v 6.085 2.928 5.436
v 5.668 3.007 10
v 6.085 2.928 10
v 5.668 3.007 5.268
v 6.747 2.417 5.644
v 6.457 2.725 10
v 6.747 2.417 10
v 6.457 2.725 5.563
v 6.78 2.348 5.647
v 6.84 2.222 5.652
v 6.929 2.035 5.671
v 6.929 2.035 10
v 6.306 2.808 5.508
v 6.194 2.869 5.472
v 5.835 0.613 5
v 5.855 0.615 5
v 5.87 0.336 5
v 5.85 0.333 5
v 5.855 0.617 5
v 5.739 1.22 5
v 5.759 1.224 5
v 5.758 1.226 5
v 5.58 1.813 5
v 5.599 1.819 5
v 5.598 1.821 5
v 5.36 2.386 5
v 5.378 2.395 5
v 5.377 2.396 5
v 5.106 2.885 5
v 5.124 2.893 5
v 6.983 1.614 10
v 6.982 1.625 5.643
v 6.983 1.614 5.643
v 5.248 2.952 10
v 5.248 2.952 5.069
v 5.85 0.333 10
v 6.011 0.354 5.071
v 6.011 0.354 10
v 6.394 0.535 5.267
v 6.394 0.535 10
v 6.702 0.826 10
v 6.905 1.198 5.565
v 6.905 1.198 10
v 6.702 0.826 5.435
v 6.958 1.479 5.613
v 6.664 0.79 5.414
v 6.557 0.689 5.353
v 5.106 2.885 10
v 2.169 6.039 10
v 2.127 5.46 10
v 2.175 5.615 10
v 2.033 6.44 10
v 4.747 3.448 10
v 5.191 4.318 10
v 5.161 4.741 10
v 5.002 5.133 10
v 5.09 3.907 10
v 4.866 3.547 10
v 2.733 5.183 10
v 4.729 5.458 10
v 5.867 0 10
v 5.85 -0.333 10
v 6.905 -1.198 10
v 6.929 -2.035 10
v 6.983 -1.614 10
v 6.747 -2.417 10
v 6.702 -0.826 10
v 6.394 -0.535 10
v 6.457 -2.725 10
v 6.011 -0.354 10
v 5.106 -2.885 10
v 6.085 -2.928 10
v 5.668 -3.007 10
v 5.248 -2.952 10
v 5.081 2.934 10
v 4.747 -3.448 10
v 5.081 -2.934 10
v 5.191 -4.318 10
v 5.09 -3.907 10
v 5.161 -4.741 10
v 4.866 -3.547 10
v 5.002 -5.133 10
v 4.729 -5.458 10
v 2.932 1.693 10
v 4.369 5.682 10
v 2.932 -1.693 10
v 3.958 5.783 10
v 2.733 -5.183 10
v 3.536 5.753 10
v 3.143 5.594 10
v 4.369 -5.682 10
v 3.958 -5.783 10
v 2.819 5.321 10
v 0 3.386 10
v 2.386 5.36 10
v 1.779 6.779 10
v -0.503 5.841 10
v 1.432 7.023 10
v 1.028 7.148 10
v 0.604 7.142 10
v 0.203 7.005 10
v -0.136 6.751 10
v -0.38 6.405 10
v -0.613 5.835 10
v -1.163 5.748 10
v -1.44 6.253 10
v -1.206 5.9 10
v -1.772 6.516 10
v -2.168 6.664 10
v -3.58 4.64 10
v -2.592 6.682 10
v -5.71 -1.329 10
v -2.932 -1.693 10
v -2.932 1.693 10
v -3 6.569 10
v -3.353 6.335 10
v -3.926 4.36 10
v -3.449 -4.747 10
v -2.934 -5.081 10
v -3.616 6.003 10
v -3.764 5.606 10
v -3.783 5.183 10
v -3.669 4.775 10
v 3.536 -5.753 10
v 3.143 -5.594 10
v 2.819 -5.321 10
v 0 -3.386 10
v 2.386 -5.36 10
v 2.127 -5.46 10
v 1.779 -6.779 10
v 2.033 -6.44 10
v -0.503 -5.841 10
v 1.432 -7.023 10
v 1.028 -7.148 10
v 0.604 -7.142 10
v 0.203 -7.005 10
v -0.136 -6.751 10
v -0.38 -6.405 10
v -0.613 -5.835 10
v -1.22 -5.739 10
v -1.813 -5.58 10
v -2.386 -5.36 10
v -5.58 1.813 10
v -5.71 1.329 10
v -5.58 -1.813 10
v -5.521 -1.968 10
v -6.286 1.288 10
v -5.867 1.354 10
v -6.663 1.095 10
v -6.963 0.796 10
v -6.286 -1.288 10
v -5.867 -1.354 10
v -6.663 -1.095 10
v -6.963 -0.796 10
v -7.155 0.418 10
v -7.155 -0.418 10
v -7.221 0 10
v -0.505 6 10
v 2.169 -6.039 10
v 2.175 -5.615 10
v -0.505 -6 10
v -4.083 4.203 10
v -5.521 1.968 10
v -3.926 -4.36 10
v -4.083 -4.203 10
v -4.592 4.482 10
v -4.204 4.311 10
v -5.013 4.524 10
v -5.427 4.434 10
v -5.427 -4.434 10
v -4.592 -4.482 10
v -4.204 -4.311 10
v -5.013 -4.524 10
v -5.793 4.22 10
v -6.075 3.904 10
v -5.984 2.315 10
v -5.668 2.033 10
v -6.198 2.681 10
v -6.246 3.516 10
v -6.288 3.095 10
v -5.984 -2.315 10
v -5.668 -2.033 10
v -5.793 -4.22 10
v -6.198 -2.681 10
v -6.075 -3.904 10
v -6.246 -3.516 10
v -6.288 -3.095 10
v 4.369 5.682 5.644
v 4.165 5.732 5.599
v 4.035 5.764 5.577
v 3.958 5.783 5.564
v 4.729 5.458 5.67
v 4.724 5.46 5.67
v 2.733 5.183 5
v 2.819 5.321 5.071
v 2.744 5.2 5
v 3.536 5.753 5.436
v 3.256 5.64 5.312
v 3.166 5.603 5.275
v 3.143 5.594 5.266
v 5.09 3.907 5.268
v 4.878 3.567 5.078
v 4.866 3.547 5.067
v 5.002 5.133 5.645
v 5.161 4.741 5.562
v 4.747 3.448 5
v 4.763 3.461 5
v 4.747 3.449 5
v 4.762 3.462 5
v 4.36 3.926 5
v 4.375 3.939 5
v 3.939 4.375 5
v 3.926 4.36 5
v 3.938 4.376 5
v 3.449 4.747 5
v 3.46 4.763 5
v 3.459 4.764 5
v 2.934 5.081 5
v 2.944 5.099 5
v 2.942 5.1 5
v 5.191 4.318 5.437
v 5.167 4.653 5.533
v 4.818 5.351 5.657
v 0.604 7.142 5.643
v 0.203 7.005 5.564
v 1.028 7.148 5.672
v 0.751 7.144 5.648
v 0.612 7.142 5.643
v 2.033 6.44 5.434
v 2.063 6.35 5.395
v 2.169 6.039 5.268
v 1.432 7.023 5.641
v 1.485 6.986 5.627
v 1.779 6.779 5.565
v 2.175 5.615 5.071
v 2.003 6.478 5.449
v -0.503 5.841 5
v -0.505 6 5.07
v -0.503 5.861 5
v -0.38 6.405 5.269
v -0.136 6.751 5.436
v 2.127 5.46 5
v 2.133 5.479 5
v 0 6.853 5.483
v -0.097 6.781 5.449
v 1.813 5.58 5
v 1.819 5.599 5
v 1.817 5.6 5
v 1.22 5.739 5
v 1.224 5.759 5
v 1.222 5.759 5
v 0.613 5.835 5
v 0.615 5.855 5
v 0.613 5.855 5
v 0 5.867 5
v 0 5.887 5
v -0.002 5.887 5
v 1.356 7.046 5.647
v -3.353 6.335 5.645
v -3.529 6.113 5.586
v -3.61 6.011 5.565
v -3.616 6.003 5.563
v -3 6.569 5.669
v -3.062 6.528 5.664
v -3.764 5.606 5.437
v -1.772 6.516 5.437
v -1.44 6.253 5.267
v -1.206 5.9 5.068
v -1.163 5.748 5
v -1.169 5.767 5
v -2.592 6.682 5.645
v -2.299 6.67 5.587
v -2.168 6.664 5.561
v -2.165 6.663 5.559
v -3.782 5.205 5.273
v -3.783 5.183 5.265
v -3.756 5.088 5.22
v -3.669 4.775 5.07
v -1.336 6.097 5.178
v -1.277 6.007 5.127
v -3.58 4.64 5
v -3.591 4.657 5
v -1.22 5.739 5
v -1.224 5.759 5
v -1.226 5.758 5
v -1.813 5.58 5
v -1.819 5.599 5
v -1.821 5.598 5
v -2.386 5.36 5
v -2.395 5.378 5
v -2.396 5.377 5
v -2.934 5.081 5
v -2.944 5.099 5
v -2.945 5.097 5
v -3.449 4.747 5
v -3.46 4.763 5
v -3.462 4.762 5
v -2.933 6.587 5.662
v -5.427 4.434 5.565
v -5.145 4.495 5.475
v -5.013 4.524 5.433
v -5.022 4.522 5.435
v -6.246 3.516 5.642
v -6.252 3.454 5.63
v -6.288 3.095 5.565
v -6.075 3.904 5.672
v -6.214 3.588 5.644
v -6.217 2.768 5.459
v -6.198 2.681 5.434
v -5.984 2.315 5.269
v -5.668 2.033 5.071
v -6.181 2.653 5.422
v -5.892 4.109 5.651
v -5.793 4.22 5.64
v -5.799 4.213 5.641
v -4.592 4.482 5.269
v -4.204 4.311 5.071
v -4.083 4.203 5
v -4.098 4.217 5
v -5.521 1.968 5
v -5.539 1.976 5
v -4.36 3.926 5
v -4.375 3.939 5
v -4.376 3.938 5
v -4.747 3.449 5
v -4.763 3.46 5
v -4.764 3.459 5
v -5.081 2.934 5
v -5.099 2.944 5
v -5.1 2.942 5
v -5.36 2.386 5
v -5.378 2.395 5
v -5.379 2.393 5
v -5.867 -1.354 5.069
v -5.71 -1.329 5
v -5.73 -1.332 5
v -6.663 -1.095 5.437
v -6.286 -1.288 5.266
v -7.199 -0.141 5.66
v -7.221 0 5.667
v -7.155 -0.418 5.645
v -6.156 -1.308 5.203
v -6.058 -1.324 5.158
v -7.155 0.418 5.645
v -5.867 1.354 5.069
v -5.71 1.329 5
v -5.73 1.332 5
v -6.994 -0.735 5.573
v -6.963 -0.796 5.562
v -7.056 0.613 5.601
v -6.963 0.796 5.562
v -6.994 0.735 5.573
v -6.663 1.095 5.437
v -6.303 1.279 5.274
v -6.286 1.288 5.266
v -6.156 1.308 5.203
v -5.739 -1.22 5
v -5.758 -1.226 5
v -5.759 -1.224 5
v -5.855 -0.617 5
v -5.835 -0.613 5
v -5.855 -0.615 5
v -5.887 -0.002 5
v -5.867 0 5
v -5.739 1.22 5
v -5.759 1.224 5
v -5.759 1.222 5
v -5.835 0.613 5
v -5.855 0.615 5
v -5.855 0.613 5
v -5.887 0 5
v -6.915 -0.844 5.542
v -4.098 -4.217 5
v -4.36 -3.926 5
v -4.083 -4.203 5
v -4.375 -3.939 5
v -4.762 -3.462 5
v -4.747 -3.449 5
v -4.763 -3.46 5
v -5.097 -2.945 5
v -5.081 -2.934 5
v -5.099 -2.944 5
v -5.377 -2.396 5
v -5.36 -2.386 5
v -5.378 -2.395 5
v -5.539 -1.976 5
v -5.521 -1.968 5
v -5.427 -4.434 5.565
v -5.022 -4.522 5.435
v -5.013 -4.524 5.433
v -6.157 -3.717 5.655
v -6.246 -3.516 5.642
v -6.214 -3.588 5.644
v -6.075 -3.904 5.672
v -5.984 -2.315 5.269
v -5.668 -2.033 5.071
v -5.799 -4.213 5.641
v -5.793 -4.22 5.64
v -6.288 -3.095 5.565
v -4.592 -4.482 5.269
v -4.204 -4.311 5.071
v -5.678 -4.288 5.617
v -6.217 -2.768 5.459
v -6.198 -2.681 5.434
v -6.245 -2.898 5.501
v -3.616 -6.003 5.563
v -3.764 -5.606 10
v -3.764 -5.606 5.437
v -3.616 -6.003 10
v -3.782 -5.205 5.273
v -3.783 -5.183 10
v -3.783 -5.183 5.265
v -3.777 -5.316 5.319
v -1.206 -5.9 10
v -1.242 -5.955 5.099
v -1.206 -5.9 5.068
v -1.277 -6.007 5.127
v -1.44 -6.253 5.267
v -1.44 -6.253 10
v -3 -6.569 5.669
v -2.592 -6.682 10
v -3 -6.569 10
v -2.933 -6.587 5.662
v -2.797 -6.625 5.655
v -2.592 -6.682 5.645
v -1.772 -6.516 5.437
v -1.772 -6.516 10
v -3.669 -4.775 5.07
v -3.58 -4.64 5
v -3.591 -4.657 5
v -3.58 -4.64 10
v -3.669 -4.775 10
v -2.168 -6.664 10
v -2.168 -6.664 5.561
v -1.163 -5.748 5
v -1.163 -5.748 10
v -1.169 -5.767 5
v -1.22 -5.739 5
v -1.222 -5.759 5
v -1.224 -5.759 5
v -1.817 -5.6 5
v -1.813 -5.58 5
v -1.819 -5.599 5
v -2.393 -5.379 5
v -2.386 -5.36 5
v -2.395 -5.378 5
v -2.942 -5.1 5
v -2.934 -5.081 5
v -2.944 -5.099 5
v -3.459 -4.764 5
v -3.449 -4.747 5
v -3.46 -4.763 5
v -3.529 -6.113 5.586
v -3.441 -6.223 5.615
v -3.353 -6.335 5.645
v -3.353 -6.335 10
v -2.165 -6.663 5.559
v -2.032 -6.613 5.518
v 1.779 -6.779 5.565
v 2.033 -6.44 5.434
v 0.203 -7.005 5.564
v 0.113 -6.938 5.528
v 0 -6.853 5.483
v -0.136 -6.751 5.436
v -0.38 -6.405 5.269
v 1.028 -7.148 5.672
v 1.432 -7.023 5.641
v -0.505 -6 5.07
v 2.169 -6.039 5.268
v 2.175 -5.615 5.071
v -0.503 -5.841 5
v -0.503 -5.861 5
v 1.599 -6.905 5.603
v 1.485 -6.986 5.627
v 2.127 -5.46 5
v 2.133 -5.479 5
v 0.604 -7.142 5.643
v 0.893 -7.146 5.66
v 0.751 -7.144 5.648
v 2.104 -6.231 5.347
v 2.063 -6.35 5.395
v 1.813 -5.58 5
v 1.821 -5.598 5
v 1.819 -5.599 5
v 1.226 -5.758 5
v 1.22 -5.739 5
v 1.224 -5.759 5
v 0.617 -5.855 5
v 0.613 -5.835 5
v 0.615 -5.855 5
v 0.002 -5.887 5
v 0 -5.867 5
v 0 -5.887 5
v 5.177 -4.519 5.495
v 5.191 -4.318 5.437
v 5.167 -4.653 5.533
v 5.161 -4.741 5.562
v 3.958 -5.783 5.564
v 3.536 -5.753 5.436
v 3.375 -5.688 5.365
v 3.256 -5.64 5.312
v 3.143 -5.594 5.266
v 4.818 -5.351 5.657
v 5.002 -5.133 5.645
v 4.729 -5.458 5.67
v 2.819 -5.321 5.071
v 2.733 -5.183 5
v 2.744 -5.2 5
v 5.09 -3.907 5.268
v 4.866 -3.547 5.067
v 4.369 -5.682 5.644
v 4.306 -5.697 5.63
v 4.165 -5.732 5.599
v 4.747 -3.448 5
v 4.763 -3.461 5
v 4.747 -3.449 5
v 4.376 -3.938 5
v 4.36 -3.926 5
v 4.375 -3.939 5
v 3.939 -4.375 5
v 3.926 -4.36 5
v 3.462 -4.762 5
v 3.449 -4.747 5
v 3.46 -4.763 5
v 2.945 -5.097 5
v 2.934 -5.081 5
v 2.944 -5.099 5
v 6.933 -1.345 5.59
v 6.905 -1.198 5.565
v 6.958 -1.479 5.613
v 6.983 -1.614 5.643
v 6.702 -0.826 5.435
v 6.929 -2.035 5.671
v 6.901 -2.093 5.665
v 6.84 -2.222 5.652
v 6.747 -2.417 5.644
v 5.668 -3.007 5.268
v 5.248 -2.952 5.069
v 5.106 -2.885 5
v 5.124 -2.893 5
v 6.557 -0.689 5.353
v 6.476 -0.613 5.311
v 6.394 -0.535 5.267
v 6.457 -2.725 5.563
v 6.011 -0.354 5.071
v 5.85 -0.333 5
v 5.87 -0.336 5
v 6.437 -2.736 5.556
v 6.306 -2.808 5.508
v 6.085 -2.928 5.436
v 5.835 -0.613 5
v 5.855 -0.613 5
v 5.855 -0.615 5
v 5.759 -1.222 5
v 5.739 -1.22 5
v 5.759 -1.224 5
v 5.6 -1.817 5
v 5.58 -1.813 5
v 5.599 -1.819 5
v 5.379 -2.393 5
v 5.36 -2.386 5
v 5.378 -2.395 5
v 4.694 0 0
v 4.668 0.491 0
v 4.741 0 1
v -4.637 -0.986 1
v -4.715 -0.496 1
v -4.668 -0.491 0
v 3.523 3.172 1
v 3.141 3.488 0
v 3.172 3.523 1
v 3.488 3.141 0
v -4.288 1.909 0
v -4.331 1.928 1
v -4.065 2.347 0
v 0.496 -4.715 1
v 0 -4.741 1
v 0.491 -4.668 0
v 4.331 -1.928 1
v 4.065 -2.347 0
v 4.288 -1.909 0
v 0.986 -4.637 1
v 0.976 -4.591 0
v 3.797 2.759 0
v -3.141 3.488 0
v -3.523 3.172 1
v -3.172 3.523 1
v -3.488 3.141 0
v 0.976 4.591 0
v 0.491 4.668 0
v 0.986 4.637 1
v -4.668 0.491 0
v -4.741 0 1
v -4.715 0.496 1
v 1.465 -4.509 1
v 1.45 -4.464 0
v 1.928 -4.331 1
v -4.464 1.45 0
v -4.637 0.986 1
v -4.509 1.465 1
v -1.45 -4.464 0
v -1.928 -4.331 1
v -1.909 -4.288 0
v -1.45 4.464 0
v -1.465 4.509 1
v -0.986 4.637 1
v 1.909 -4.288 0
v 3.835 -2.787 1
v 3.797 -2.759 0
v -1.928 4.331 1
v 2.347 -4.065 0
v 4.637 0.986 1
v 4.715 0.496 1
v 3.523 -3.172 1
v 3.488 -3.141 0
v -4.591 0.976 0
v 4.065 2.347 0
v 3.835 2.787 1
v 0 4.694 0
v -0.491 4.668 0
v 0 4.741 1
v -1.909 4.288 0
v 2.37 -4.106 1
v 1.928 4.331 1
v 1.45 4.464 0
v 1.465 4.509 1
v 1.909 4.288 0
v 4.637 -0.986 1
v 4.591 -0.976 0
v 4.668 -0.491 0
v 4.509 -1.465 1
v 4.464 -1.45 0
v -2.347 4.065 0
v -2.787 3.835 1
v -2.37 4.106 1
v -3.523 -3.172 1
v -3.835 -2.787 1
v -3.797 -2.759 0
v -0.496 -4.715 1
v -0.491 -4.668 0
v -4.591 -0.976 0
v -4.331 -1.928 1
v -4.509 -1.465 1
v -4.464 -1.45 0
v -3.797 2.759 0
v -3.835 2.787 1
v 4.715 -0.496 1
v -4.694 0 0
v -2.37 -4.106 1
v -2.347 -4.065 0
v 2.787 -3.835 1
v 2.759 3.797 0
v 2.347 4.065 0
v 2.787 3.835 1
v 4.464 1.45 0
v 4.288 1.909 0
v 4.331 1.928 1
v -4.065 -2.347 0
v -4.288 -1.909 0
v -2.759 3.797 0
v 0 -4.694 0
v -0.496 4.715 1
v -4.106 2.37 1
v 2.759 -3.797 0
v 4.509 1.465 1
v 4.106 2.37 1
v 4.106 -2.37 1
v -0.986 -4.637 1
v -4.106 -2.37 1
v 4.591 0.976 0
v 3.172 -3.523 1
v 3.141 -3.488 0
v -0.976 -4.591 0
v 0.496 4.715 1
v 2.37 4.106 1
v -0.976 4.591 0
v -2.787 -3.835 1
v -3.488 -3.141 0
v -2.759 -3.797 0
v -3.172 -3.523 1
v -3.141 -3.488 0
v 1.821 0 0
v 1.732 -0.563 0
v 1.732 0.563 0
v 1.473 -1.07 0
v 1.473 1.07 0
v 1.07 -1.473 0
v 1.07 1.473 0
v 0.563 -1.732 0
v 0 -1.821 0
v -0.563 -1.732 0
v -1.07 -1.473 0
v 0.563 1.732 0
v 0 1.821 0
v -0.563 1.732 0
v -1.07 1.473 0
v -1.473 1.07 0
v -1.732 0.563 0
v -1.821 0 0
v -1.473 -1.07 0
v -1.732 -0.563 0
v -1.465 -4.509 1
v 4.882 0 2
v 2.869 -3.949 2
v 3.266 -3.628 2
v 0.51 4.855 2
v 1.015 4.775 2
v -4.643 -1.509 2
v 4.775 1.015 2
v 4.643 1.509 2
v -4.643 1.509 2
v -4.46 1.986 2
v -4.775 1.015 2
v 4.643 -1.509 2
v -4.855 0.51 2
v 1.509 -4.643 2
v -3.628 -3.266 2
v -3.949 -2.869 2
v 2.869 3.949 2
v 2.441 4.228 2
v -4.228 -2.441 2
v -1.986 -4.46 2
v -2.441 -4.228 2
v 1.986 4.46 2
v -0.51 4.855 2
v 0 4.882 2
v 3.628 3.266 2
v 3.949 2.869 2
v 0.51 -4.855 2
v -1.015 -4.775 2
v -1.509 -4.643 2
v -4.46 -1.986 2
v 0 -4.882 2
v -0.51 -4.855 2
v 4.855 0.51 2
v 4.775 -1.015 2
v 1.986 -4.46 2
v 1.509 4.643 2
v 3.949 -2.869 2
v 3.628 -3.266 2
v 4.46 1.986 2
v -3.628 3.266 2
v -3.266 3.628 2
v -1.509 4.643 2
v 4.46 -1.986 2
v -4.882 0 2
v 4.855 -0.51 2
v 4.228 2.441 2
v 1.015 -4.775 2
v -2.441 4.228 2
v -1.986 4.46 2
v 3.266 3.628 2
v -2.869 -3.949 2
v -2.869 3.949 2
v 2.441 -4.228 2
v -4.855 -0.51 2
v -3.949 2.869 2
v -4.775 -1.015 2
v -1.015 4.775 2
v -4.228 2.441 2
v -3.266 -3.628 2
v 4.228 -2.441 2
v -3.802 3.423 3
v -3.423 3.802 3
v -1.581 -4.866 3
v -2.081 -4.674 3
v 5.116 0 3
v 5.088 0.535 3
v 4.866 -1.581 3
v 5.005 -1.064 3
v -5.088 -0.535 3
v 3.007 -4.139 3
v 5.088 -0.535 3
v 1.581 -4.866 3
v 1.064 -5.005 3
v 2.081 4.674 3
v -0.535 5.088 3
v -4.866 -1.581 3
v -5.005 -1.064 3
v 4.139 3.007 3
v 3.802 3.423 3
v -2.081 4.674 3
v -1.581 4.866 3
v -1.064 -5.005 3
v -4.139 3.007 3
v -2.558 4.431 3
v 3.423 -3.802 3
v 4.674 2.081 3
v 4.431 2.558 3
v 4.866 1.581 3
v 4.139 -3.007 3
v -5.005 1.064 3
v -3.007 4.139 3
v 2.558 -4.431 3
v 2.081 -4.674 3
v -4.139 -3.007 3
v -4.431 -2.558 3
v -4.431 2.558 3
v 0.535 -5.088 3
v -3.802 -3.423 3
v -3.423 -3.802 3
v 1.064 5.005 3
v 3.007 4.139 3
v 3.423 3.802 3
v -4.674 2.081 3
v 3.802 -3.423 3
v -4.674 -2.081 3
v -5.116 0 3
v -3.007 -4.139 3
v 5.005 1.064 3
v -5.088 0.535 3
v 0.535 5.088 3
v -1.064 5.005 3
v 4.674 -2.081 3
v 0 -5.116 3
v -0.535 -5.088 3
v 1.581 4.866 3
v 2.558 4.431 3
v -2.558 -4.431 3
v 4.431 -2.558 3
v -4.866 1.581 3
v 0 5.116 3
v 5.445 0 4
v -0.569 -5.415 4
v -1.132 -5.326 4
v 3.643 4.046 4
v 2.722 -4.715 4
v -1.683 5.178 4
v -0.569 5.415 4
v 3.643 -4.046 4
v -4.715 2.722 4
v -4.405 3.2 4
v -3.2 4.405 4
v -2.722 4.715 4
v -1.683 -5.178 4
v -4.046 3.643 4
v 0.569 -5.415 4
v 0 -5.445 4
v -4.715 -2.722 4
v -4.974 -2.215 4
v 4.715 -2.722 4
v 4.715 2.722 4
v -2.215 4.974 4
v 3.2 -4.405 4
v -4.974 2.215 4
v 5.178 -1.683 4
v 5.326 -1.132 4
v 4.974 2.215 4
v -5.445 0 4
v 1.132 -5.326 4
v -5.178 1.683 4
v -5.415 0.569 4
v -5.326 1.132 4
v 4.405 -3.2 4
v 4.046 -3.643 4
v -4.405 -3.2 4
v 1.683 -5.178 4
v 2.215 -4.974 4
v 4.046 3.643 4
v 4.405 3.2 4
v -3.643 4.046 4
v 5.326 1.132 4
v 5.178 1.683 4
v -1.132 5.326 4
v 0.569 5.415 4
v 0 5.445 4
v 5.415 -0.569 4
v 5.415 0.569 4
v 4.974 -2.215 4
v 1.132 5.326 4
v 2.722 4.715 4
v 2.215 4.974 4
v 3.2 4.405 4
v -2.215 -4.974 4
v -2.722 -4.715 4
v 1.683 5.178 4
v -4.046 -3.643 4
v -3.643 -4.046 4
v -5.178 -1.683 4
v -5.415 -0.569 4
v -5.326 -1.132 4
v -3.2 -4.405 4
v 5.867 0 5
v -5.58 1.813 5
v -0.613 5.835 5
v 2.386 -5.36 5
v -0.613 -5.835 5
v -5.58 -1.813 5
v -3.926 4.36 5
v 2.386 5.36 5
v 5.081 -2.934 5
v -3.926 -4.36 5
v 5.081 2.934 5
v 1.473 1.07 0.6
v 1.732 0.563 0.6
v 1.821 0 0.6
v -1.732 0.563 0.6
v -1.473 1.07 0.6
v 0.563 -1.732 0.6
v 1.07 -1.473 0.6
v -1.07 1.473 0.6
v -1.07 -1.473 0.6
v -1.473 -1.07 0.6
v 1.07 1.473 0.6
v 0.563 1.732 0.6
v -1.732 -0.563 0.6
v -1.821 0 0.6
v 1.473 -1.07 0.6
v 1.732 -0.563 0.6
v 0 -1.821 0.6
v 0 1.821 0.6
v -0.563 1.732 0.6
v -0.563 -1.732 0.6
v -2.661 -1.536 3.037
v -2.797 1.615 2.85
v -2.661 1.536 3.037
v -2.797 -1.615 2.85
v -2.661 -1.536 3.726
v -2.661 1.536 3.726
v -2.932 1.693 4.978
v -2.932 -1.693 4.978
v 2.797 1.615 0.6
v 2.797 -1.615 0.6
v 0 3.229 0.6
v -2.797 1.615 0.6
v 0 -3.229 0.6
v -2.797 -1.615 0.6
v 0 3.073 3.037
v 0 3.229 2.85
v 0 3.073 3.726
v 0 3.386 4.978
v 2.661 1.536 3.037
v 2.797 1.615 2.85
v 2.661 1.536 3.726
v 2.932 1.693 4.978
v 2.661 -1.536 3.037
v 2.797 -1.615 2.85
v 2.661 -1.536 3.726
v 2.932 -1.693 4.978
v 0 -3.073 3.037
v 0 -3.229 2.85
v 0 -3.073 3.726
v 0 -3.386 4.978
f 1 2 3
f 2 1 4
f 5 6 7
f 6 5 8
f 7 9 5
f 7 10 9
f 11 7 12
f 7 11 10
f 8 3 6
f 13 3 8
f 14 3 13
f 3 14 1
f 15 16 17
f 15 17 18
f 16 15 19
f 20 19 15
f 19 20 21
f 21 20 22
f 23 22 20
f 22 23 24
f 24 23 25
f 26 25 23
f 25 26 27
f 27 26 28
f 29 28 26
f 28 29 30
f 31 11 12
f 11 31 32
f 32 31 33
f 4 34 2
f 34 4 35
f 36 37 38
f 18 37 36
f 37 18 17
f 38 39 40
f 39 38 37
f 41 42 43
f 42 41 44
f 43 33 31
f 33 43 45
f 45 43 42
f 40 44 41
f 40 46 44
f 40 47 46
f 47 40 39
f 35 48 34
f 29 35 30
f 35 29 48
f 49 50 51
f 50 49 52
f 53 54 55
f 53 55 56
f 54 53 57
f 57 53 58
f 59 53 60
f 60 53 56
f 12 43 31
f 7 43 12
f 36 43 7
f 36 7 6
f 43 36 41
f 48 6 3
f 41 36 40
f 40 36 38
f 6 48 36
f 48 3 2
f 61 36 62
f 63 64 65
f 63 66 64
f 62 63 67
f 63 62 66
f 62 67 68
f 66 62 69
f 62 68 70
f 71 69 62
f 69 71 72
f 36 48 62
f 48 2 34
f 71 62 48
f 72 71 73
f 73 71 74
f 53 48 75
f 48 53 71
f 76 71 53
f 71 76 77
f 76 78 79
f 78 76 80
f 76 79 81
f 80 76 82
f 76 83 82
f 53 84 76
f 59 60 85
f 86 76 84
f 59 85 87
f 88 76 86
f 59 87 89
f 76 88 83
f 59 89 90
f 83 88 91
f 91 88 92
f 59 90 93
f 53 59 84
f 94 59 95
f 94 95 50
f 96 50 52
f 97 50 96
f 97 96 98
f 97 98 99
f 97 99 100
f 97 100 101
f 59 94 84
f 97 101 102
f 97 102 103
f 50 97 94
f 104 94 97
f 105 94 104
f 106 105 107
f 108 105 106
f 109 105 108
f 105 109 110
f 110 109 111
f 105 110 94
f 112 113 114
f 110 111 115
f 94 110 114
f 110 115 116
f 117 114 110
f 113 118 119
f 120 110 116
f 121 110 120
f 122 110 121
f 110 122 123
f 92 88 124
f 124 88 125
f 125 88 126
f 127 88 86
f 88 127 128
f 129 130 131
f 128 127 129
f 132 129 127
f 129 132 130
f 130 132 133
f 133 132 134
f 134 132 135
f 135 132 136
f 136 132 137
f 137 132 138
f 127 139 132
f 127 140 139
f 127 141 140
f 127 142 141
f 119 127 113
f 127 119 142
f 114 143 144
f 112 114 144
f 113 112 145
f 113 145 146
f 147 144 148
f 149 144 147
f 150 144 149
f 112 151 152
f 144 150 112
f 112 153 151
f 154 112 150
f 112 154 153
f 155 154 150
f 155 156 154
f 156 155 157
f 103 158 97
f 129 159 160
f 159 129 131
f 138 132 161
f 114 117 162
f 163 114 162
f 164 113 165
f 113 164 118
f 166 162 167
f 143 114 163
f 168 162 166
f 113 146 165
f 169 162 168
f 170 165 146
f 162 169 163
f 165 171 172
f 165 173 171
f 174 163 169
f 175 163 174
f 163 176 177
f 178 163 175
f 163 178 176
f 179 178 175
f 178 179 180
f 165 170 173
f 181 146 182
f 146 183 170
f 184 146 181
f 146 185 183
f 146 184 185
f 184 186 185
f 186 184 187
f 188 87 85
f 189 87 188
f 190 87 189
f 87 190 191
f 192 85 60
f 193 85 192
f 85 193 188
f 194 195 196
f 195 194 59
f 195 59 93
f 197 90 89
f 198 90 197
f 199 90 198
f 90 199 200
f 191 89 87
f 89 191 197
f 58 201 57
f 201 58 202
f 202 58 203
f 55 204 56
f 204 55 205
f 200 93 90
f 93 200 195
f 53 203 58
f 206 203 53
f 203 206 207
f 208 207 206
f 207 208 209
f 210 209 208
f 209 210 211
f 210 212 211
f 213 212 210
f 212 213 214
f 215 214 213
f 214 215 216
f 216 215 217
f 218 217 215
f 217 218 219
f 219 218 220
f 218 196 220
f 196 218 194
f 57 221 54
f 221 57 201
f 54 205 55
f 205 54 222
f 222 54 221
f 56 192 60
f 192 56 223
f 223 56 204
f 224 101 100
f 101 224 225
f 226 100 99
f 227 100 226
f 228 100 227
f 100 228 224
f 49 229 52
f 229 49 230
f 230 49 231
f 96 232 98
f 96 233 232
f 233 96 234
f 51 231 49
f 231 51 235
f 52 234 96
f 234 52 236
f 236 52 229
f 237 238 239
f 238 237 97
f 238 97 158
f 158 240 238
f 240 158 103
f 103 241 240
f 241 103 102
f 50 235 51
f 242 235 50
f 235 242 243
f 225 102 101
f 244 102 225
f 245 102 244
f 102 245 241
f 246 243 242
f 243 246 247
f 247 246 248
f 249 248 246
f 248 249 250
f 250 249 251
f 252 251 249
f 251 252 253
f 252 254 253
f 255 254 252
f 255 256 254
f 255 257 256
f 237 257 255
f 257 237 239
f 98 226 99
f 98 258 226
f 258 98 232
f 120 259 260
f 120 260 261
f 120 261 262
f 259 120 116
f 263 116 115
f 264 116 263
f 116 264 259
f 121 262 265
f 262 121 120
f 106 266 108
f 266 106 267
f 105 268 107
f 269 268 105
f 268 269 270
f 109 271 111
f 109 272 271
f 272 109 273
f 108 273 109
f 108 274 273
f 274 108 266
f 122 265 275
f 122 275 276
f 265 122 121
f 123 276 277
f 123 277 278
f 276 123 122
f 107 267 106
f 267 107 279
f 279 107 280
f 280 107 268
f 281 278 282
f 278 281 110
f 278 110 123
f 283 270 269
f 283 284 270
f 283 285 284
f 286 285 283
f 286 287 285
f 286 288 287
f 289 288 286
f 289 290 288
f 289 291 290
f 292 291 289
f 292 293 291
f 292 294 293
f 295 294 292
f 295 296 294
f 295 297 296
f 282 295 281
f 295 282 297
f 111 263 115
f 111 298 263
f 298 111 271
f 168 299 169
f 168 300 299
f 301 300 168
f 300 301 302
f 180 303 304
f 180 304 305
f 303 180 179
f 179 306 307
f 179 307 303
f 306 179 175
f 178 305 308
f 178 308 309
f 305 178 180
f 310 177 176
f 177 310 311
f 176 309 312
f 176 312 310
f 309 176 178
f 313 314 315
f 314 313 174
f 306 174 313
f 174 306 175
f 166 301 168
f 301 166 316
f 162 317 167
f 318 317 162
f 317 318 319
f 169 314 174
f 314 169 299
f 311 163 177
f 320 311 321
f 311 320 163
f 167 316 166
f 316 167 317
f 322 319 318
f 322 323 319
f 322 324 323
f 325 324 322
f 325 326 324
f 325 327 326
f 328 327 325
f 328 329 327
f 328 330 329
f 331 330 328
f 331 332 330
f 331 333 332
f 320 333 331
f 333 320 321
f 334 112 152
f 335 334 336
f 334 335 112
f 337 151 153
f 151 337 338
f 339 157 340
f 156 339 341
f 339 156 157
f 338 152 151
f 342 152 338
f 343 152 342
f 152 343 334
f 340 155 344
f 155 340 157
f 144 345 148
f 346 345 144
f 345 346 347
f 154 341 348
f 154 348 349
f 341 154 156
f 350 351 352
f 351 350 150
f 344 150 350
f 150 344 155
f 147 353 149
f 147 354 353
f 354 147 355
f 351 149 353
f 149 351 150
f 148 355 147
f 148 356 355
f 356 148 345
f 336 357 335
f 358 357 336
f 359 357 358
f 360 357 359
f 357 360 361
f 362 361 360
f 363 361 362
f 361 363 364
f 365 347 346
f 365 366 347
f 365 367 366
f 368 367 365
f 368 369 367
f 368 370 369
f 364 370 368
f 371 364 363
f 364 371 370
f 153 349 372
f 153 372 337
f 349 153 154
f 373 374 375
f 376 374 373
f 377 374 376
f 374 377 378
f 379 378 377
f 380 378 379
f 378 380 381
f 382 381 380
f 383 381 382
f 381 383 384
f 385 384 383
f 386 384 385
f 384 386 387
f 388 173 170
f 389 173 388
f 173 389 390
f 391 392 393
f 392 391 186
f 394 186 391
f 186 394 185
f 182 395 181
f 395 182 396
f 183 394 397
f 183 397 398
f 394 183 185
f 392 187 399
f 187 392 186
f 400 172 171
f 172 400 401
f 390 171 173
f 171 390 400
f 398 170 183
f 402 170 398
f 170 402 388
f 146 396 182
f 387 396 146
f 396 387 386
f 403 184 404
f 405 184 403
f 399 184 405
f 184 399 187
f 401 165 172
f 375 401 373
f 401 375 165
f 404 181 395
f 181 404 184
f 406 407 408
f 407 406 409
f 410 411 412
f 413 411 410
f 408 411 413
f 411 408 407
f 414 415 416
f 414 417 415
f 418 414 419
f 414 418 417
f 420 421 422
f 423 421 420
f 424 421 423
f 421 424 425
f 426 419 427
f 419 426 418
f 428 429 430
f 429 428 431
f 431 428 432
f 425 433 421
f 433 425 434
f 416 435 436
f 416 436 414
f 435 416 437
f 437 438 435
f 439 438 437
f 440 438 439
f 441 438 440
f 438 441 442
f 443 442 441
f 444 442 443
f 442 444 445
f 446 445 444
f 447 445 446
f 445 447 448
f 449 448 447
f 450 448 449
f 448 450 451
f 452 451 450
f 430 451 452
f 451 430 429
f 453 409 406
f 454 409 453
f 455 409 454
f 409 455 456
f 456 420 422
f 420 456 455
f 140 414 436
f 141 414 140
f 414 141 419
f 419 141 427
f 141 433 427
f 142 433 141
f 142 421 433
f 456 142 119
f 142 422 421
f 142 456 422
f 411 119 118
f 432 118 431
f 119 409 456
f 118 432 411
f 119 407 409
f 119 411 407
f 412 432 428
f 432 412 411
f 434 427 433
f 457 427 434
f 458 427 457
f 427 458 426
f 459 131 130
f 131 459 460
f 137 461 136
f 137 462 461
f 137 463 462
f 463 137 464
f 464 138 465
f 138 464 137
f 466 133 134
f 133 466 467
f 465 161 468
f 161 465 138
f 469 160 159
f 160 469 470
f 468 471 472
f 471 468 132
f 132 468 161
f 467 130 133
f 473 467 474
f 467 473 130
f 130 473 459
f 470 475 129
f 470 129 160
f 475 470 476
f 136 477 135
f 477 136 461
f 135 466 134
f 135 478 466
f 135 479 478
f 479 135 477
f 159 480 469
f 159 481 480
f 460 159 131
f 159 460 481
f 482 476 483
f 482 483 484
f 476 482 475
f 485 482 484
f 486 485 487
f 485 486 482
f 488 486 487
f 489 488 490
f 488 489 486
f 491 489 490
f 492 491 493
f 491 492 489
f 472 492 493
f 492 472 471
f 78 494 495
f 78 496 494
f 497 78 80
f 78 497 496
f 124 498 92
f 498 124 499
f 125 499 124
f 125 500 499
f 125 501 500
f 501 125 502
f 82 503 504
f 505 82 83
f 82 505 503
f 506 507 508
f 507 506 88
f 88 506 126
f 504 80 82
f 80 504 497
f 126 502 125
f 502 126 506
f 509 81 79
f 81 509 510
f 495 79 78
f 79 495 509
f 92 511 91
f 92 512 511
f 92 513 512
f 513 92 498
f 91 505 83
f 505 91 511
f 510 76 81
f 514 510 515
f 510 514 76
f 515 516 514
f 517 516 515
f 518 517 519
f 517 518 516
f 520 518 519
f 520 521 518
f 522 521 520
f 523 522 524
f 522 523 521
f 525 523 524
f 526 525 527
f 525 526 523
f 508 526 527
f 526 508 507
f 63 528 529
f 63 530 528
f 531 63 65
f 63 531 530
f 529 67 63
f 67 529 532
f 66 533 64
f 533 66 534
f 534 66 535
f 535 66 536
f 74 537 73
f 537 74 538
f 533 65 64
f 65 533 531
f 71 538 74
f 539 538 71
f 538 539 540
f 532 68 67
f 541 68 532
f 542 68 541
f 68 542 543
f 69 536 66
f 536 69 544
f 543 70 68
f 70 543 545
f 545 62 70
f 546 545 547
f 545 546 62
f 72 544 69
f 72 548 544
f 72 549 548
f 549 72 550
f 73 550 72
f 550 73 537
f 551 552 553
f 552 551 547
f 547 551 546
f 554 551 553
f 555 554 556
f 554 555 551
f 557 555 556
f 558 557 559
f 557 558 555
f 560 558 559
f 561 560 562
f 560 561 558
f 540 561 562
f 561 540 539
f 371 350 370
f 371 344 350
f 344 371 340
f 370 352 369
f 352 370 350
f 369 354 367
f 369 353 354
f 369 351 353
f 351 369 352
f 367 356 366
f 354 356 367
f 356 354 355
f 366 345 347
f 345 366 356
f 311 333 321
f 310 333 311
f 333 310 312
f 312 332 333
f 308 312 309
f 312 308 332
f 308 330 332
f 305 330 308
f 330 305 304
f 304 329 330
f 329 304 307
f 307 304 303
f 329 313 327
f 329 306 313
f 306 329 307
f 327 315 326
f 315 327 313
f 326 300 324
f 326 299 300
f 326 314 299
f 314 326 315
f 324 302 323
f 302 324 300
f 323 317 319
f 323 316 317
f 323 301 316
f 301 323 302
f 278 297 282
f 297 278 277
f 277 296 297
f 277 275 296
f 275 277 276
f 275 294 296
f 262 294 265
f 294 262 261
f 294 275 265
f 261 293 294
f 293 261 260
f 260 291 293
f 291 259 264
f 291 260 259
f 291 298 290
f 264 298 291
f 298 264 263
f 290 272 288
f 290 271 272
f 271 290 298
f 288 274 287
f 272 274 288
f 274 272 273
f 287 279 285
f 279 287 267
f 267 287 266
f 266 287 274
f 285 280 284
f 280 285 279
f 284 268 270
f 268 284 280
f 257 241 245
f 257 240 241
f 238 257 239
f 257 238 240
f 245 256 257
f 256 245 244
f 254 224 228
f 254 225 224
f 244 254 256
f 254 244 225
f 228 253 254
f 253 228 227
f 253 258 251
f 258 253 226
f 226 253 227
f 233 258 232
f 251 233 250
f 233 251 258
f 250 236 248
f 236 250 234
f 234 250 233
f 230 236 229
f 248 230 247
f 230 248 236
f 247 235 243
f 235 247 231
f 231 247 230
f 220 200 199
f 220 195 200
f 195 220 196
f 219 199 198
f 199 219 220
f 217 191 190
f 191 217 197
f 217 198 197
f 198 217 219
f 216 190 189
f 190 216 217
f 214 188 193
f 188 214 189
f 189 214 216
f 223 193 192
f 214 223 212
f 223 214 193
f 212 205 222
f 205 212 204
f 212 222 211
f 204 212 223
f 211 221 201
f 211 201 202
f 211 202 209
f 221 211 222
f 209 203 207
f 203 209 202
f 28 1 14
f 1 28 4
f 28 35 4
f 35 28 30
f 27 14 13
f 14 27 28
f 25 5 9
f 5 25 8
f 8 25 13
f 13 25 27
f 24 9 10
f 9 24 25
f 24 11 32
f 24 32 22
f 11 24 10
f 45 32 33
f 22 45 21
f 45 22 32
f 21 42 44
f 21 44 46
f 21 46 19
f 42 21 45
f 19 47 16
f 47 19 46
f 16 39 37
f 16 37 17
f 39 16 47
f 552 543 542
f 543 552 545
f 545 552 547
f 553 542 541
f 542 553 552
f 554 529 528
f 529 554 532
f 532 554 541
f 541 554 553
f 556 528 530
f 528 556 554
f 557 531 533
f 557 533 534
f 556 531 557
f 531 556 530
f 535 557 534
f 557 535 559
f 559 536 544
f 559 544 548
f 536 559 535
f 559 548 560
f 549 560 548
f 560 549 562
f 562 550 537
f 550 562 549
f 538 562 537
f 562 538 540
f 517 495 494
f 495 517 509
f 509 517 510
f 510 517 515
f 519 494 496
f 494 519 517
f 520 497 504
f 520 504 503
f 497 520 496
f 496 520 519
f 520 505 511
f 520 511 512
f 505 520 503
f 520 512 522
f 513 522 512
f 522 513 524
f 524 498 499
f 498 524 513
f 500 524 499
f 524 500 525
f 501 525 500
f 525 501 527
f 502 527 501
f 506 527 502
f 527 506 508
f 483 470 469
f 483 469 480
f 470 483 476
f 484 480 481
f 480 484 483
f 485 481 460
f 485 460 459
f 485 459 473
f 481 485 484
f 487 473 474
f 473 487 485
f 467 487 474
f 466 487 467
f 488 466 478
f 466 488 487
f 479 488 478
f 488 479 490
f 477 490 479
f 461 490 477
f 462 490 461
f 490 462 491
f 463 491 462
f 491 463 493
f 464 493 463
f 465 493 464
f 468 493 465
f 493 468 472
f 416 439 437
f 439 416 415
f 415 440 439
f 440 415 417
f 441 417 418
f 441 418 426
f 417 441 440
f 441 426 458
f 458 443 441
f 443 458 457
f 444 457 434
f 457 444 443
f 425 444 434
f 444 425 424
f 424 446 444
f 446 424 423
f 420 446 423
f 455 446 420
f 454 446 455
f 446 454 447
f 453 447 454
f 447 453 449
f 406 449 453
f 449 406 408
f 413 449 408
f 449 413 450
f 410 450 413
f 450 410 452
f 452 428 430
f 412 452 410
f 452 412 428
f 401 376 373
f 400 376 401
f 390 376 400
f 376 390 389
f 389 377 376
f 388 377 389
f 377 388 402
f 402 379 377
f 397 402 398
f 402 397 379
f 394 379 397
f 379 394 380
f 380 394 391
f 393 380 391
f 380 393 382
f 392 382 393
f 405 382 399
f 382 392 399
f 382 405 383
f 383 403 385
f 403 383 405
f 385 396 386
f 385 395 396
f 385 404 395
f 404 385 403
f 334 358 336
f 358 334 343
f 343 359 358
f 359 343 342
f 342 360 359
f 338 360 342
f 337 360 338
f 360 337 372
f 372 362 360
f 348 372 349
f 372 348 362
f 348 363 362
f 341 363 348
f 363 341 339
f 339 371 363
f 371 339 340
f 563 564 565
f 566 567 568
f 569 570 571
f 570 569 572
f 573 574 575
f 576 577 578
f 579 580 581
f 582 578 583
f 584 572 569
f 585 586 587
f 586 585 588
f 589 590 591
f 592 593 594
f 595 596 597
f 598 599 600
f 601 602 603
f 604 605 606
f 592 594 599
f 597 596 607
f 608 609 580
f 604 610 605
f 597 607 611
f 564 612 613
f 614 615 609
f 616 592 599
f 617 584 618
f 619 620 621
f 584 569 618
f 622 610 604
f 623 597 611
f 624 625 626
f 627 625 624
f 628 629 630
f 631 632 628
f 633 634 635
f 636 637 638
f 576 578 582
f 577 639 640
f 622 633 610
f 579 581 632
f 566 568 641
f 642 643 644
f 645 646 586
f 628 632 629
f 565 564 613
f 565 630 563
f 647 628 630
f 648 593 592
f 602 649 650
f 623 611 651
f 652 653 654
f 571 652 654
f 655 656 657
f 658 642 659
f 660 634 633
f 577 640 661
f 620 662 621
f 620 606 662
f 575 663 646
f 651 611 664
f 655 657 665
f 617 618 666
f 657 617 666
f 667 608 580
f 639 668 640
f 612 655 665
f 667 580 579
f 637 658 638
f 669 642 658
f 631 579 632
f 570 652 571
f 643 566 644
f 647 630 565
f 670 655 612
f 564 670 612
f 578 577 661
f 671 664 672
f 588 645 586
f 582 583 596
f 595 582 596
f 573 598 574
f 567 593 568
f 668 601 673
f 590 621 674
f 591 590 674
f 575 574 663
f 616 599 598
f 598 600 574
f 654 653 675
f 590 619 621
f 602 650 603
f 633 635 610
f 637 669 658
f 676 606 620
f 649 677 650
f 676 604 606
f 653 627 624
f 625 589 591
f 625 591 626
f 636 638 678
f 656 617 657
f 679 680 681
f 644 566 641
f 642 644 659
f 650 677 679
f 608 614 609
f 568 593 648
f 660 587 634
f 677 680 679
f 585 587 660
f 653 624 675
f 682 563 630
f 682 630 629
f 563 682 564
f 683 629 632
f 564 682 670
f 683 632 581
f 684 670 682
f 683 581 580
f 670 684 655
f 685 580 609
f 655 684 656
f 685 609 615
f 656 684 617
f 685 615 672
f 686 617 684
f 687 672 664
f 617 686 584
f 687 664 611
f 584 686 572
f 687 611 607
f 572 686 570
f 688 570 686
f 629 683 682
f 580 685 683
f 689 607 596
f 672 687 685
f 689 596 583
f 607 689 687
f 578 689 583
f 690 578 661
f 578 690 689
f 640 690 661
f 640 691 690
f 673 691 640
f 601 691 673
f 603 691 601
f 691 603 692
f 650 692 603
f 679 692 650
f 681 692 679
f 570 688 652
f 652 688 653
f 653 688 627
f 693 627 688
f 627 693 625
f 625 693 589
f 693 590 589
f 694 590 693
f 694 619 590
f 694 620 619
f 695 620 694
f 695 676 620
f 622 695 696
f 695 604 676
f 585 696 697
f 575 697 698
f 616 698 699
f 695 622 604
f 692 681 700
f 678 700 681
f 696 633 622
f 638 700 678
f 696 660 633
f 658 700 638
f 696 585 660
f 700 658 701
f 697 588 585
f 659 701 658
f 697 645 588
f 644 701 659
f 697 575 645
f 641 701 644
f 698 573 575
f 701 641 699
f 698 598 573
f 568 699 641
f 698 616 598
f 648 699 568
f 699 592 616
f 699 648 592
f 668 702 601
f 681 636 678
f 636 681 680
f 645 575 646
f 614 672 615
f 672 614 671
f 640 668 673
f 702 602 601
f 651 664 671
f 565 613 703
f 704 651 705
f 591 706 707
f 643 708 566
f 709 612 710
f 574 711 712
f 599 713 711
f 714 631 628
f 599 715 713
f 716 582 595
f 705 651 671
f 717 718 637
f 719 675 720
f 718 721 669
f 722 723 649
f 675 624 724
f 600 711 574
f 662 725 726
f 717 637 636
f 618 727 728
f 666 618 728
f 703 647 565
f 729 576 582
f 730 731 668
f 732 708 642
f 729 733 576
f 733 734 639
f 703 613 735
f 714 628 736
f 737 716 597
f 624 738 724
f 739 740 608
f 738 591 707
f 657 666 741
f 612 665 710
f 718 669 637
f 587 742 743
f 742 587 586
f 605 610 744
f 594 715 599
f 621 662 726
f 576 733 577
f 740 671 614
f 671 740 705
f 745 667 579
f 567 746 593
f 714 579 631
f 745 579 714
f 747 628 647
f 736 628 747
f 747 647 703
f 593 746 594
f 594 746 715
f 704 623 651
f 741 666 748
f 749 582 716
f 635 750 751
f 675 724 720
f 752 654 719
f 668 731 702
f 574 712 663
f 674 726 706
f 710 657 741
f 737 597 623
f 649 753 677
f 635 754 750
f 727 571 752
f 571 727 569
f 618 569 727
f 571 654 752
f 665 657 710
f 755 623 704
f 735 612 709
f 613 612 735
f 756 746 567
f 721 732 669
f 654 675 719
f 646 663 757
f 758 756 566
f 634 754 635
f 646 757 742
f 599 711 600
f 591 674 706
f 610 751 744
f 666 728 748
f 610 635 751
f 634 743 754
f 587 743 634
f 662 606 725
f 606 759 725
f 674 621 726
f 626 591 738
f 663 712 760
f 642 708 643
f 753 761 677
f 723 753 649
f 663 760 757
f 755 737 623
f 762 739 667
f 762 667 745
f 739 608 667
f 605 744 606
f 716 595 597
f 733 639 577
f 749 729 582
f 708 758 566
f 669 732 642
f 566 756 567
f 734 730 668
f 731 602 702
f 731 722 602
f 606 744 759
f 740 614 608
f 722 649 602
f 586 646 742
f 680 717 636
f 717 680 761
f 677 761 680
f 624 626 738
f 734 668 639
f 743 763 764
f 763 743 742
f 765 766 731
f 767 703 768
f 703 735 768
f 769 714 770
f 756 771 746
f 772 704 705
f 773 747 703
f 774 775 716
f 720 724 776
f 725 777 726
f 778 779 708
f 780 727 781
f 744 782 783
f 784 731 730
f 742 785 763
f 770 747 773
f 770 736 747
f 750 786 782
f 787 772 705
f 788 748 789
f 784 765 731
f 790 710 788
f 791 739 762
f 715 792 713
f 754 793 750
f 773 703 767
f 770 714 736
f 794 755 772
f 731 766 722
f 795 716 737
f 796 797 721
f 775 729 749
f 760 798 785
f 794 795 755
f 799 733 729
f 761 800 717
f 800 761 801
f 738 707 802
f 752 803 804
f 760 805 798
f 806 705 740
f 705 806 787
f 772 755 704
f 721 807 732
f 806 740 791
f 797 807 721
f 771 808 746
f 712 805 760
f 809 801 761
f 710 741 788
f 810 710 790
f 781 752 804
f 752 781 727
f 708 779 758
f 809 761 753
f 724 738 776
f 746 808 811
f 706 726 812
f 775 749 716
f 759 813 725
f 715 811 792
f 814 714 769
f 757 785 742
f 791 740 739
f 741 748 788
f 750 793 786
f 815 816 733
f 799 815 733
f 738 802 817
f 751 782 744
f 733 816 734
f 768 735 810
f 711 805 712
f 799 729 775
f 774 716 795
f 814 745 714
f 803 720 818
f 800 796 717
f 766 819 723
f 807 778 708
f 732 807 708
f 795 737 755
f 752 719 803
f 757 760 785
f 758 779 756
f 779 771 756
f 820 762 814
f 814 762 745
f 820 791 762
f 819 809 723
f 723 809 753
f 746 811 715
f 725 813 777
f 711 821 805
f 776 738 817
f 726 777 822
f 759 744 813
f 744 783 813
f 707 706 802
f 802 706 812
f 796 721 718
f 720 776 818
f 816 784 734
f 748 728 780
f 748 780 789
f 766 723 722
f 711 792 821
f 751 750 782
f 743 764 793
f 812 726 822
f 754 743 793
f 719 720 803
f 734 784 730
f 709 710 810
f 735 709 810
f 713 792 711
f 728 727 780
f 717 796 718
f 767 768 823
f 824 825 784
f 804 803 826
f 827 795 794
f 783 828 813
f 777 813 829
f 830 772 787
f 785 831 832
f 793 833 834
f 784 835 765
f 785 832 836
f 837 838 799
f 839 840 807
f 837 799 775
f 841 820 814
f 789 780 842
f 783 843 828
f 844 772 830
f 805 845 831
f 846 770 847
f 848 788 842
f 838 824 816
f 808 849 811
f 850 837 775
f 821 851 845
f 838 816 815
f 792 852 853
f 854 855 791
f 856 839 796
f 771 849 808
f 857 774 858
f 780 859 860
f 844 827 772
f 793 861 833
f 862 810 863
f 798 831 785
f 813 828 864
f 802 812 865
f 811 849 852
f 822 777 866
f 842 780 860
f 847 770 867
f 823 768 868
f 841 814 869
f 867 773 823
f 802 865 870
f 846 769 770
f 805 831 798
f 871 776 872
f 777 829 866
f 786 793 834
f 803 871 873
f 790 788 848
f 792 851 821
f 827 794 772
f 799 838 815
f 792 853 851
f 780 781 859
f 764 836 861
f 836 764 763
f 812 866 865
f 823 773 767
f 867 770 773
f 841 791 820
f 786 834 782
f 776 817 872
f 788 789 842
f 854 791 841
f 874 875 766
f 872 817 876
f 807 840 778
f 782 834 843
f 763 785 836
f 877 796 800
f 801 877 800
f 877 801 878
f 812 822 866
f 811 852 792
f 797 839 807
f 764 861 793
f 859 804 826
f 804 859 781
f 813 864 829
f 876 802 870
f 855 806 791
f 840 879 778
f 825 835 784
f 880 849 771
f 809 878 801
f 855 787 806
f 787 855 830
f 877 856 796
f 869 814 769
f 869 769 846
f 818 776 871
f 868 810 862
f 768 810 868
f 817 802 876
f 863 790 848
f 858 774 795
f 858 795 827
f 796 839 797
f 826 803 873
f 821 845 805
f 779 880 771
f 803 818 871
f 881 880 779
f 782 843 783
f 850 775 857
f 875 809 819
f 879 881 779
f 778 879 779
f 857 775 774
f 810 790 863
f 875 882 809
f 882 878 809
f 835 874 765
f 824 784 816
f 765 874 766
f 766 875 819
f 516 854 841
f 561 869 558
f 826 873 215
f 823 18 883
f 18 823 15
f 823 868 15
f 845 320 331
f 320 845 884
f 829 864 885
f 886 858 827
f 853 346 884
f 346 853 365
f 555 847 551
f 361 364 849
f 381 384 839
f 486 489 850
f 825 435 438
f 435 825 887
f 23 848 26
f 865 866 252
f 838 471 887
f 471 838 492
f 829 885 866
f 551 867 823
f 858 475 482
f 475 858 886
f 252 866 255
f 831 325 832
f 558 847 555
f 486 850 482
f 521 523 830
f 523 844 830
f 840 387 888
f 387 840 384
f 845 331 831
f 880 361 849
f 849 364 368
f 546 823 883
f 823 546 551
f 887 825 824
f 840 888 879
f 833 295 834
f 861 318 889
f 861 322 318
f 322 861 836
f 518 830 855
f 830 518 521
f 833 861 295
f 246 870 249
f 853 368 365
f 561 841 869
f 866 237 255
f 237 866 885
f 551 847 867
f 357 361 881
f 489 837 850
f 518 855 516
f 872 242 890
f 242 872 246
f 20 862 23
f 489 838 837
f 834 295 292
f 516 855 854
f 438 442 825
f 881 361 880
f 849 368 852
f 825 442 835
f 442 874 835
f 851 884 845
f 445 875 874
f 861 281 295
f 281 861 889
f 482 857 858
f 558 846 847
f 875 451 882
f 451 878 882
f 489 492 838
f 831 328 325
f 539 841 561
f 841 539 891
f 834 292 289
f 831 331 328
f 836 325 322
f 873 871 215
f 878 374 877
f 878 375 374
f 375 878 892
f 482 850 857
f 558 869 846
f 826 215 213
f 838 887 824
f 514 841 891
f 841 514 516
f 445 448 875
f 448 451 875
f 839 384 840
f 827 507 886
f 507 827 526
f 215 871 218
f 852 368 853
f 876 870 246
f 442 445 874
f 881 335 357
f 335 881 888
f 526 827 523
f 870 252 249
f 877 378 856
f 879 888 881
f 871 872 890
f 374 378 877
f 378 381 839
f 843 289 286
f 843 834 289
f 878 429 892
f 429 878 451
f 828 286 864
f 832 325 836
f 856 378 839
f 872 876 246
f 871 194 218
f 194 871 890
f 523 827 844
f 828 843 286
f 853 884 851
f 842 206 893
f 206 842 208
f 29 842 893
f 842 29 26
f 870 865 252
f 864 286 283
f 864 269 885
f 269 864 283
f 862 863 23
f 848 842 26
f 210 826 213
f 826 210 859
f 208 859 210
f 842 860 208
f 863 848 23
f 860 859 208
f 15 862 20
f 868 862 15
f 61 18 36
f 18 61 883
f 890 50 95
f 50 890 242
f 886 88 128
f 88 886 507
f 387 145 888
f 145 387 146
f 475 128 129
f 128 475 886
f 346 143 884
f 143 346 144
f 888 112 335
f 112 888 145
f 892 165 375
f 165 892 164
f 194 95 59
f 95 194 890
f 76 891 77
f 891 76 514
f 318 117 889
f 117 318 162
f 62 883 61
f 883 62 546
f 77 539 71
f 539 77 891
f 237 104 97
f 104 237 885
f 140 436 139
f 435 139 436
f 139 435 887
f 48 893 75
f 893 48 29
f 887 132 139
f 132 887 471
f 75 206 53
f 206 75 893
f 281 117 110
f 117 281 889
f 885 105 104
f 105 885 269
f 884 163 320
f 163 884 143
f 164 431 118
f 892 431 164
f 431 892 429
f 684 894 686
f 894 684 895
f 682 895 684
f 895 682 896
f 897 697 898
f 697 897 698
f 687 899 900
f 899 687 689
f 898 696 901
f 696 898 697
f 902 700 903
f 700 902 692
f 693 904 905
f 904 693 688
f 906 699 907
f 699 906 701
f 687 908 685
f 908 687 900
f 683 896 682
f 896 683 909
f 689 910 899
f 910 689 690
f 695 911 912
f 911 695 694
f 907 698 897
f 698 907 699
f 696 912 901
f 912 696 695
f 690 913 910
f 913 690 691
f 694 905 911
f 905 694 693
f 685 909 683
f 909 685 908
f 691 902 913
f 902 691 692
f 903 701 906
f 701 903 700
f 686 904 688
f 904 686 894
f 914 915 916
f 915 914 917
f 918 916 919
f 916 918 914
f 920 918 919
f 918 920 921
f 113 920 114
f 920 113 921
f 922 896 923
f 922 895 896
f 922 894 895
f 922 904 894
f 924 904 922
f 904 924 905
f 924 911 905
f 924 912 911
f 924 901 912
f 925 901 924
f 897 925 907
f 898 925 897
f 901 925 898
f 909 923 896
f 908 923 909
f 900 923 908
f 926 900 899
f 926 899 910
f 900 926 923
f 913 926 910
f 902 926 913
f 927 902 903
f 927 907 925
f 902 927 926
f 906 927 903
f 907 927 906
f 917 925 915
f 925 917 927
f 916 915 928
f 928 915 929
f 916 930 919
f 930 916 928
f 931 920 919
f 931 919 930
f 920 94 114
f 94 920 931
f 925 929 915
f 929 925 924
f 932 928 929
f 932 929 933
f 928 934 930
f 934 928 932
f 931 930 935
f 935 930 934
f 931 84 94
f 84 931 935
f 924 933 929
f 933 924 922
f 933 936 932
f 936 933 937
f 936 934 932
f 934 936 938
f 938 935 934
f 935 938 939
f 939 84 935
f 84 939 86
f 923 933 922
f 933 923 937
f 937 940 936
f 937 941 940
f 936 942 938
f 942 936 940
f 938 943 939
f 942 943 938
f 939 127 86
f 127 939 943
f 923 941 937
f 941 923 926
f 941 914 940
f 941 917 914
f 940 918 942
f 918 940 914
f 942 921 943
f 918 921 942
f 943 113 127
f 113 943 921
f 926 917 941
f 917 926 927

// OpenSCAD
// 'Ultimate Nut Knob Generator' by wstein 
// is licensed under the Attribution - Non-Commercial - Share Alike license. 
// Version 1.5 (c) April 2015
// please refer the complete license here: http://creativecommons.org/licenses/by-nc-sa/3.0/legalcoe
//
// V1.1: some smaller improvements and new parameter "supportless_friendly" and "screw_hole_length"
// V1.2: flip very long knobs (miniature hex handle) and new hex shape
// V1.5: new support of tetragon up to octagon nuts
//       new wing shape
//       error in calulation of nuts fixed (relevant on bigger ones)
// V1.5.1: Global fix for latest Customizer

// preview[view:west, tilt:top diagonal]

//to show in Customizer - you get always all parts!
part = "cylindrical"; // [hex,simple,cylindrical,clamp,rounded,wing]

//across flats (M3 = 5.42, Allen = 6.35)
nut_width = 5.42;
nut_thickness = 2.5;

//of knob
height=10;

// in percent of knob height
knurled_height=50; //[10:100]

/*[Advanced]*/
echo("nut_diameter",nut_diameter);

// calculated relative to hex nut diameter
diameter_1=150; //[100:300]
function get_diameter_1()=hex_nut_diameter*diameter_1/100;

// in percent of Diameter 1 
diameter_2=125; //[100:200]
function get_diameter_2()=get_diameter_1()*diameter_2/100;

// in percent of nut diameter
screw_hole_diameter = 55; //[0:100]
function get_screw_hole_diameter()=nut_diameter*screw_hole_diameter/100;

// in percent of knob height
screw_hole_length = 100; //[0:100]
function get_screw_hole_length()=height*screw_hole_length/100;

// should be multiple of layer thickness (0.6 should be perfect for 0.1, 0.2, 0.3mm layer thickness). Use 0 for open bottom like the screwdriver handle
bottom_thickness = 0.6;

/*[Knurled]*/
//no effect on wing style
knurled_density=50; //[0:100]

knurled_strong=5;//[1:20]

/*[Expert]*/

//- tetragon=4, pentagon=5, hexagon=6, octagon=8
nut_sides=6;//[4,5,6,8]

// prevented some extreme overhangs
supportless_friendly=1; //[0:false,1:true]

//increase if it fits to tight
backlash=0.1;

cross_section=0; //[0:false,1:true]

/*[Hidden]*/
function get_knurled_n()= (
    part=="hex" ? 6 : (
    part=="wing" ? 2 : (
    round(sqrt(10*get_diameter_2())*get_knurled_density_factor()))));
    
function get_knurled_density_factor()=pow(10,knurled_density/50-1);
echo("get_knurled_density_factor()", get_knurled_density_factor());

nut_diameter = nut_width/cos(360/nut_sides/2);
hex_nut_diameter = nut_width/cos(360/6/2);

knurled_r=sqrt(10*get_diameter_2())/40*knurled_strong;

h1=height-height*knurled_height/100;
hlist=[0,h1/5,h1*2/5,h1*3/5,h1*4/5,h1,height];
rstep=[0,pow(0.2,2),pow(0.4,2),pow(0.6,2),pow(0.8,2),pow(1.0,2),pow(1.0,2)];
rlist=rstep*(get_diameter_2()-get_diameter_1());

if(height-h1-2.1*knurled_r>0||part!="rounded")
rotate(nut_width*5<height?[0,90,0]:(bottom_thickness==0.0?[180,0,0]:[0,0,0]))
union()
{
	difference()
	{
		union()
		{
			create_knurled();
	
			for(n=[0:5])
			translate([0,0,hlist[n]])
			cylinder(r1=(get_diameter_1()+rlist[n])/2,r2=(get_diameter_1()+rlist[n+1])/2,h=hlist[n+1]-hlist[n],$fn=60);
		}
	
		if(get_screw_hole_diameter()>0&&screw_hole_length>0)
		translate([0,0,-.1])
		cylinder(r=get_screw_hole_diameter()/2+backlash,h=get_screw_hole_length()+.11,$fn=20);

		assign(r1=1.0*nut_diameter/2+backlash)
		assign(r2=0.95*nut_diameter/2+backlash)
		assign(r3=1.05*nut_diameter/2+backlash)
		assign(h1=bottom_thickness)
		assign(h2=h1+nut_thickness-0.04*nut_diameter)
		assign(h3=h1+nut_thickness-0.01*nut_diameter)
		assign(h30=h1+nut_thickness)
		assign(h4=h1+nut_thickness+.1*nut_diameter)
		assign(h5=h4+.2*nut_diameter)
		assign(h6=max(h5,height))
        rotate([0,0,360/nut_sides/2])
		rotate_extrude($fn=nut_sides)
		if(bottom_thickness>0)
		polygon(points=[[r1,h1],[r1,h2],[r2,h3],[r2,h4],[r3,h5],[r3,h6+.1],[0,h6+.1],[0,h1]]);
		else
		polygon(points=[[r1,h1-.1],[r1,h30],[0,h30],[0,h1]]);
	
		if(cross_section)
		translate([-1000/2,0,-.1])
		cube([1000,1000,100]);
	}
}
else
for(a=[-45,45])
rotate([0,0,a])
cube([1,10,0.2],center=true);

module create_knurled()
translate([0,0,h1])
difference()
{
	if(part=="simple")
	create_simple_knurled();
	else if(part=="hex")
    hull()
	create_shaped_knurled();
	else if(part=="clamp")
	create_knurled_clamp();
    else if(part=="wing")
    create_wings();
	else
	create_shaped_knurled();

	assign(points=[[get_diameter_2()/2,-.01],[get_diameter_2()/2+1000,1000/2],[get_diameter_2()/2+1000,-.01]])
	if(part!="rounded"&&bottom_thickness!=0.0&&supportless_friendly==1)
	rotate_extrude($fn=60)
	polygon(points);
}

module create_knurled_clamp()
difference()
{
	cylinder(r=(2*knurled_r+get_diameter_2())/2,h=height-h1,$fn=60);

	for(a=[0:get_knurled_n()-1])
	rotate(360/get_knurled_n()*a)
	translate([get_diameter_2()/2+knurled_r,0,-.1])
	cylinder(r=knurled_r,h=height-h1+.2,$fn=30);
}

module create_simple_knurled(fn=4)
assign(n=round(get_knurled_n()/2))
for(a=[0:n-1])
rotate(360/fn/n*(a+.5))
cylinder(r=(2*knurled_r+get_diameter_2())/2,h=height-h1,$fn=fn);

module create_shaped_knurled()
for(a=[0:get_knurled_n()-1])
rotate(360/get_knurled_n()*(a+.5))
translate([get_diameter_2()/2,0,0])
if(part=="rounded"||part=="hex")
hull()
create_knurled_rounded();
else if(part=="cylindrical")
create_knurled_cylindrical();

module create_knurled_rounded()
for(z=[knurled_r,height-h1-knurled_r])
translate([0,0,z])
sphere(r=knurled_r,$fn=20);

module create_knurled_cylindrical()
cylinder(r=knurled_r,h=height-h1,$fn=20);

module create_wings()
assign(len=knurled_r*get_diameter_2()*.7)
linear_extrude(height=height-h1,convexity=20)
hull()
{
    circle(r=get_diameter_2()/2,$fn=60);
        
    for(a=[0:1])
    rotate(360/get_knurled_n()*(a+.5))
    translate([len,0,0])
    circle(r=get_diameter_2()/4,$fn=30);
}
